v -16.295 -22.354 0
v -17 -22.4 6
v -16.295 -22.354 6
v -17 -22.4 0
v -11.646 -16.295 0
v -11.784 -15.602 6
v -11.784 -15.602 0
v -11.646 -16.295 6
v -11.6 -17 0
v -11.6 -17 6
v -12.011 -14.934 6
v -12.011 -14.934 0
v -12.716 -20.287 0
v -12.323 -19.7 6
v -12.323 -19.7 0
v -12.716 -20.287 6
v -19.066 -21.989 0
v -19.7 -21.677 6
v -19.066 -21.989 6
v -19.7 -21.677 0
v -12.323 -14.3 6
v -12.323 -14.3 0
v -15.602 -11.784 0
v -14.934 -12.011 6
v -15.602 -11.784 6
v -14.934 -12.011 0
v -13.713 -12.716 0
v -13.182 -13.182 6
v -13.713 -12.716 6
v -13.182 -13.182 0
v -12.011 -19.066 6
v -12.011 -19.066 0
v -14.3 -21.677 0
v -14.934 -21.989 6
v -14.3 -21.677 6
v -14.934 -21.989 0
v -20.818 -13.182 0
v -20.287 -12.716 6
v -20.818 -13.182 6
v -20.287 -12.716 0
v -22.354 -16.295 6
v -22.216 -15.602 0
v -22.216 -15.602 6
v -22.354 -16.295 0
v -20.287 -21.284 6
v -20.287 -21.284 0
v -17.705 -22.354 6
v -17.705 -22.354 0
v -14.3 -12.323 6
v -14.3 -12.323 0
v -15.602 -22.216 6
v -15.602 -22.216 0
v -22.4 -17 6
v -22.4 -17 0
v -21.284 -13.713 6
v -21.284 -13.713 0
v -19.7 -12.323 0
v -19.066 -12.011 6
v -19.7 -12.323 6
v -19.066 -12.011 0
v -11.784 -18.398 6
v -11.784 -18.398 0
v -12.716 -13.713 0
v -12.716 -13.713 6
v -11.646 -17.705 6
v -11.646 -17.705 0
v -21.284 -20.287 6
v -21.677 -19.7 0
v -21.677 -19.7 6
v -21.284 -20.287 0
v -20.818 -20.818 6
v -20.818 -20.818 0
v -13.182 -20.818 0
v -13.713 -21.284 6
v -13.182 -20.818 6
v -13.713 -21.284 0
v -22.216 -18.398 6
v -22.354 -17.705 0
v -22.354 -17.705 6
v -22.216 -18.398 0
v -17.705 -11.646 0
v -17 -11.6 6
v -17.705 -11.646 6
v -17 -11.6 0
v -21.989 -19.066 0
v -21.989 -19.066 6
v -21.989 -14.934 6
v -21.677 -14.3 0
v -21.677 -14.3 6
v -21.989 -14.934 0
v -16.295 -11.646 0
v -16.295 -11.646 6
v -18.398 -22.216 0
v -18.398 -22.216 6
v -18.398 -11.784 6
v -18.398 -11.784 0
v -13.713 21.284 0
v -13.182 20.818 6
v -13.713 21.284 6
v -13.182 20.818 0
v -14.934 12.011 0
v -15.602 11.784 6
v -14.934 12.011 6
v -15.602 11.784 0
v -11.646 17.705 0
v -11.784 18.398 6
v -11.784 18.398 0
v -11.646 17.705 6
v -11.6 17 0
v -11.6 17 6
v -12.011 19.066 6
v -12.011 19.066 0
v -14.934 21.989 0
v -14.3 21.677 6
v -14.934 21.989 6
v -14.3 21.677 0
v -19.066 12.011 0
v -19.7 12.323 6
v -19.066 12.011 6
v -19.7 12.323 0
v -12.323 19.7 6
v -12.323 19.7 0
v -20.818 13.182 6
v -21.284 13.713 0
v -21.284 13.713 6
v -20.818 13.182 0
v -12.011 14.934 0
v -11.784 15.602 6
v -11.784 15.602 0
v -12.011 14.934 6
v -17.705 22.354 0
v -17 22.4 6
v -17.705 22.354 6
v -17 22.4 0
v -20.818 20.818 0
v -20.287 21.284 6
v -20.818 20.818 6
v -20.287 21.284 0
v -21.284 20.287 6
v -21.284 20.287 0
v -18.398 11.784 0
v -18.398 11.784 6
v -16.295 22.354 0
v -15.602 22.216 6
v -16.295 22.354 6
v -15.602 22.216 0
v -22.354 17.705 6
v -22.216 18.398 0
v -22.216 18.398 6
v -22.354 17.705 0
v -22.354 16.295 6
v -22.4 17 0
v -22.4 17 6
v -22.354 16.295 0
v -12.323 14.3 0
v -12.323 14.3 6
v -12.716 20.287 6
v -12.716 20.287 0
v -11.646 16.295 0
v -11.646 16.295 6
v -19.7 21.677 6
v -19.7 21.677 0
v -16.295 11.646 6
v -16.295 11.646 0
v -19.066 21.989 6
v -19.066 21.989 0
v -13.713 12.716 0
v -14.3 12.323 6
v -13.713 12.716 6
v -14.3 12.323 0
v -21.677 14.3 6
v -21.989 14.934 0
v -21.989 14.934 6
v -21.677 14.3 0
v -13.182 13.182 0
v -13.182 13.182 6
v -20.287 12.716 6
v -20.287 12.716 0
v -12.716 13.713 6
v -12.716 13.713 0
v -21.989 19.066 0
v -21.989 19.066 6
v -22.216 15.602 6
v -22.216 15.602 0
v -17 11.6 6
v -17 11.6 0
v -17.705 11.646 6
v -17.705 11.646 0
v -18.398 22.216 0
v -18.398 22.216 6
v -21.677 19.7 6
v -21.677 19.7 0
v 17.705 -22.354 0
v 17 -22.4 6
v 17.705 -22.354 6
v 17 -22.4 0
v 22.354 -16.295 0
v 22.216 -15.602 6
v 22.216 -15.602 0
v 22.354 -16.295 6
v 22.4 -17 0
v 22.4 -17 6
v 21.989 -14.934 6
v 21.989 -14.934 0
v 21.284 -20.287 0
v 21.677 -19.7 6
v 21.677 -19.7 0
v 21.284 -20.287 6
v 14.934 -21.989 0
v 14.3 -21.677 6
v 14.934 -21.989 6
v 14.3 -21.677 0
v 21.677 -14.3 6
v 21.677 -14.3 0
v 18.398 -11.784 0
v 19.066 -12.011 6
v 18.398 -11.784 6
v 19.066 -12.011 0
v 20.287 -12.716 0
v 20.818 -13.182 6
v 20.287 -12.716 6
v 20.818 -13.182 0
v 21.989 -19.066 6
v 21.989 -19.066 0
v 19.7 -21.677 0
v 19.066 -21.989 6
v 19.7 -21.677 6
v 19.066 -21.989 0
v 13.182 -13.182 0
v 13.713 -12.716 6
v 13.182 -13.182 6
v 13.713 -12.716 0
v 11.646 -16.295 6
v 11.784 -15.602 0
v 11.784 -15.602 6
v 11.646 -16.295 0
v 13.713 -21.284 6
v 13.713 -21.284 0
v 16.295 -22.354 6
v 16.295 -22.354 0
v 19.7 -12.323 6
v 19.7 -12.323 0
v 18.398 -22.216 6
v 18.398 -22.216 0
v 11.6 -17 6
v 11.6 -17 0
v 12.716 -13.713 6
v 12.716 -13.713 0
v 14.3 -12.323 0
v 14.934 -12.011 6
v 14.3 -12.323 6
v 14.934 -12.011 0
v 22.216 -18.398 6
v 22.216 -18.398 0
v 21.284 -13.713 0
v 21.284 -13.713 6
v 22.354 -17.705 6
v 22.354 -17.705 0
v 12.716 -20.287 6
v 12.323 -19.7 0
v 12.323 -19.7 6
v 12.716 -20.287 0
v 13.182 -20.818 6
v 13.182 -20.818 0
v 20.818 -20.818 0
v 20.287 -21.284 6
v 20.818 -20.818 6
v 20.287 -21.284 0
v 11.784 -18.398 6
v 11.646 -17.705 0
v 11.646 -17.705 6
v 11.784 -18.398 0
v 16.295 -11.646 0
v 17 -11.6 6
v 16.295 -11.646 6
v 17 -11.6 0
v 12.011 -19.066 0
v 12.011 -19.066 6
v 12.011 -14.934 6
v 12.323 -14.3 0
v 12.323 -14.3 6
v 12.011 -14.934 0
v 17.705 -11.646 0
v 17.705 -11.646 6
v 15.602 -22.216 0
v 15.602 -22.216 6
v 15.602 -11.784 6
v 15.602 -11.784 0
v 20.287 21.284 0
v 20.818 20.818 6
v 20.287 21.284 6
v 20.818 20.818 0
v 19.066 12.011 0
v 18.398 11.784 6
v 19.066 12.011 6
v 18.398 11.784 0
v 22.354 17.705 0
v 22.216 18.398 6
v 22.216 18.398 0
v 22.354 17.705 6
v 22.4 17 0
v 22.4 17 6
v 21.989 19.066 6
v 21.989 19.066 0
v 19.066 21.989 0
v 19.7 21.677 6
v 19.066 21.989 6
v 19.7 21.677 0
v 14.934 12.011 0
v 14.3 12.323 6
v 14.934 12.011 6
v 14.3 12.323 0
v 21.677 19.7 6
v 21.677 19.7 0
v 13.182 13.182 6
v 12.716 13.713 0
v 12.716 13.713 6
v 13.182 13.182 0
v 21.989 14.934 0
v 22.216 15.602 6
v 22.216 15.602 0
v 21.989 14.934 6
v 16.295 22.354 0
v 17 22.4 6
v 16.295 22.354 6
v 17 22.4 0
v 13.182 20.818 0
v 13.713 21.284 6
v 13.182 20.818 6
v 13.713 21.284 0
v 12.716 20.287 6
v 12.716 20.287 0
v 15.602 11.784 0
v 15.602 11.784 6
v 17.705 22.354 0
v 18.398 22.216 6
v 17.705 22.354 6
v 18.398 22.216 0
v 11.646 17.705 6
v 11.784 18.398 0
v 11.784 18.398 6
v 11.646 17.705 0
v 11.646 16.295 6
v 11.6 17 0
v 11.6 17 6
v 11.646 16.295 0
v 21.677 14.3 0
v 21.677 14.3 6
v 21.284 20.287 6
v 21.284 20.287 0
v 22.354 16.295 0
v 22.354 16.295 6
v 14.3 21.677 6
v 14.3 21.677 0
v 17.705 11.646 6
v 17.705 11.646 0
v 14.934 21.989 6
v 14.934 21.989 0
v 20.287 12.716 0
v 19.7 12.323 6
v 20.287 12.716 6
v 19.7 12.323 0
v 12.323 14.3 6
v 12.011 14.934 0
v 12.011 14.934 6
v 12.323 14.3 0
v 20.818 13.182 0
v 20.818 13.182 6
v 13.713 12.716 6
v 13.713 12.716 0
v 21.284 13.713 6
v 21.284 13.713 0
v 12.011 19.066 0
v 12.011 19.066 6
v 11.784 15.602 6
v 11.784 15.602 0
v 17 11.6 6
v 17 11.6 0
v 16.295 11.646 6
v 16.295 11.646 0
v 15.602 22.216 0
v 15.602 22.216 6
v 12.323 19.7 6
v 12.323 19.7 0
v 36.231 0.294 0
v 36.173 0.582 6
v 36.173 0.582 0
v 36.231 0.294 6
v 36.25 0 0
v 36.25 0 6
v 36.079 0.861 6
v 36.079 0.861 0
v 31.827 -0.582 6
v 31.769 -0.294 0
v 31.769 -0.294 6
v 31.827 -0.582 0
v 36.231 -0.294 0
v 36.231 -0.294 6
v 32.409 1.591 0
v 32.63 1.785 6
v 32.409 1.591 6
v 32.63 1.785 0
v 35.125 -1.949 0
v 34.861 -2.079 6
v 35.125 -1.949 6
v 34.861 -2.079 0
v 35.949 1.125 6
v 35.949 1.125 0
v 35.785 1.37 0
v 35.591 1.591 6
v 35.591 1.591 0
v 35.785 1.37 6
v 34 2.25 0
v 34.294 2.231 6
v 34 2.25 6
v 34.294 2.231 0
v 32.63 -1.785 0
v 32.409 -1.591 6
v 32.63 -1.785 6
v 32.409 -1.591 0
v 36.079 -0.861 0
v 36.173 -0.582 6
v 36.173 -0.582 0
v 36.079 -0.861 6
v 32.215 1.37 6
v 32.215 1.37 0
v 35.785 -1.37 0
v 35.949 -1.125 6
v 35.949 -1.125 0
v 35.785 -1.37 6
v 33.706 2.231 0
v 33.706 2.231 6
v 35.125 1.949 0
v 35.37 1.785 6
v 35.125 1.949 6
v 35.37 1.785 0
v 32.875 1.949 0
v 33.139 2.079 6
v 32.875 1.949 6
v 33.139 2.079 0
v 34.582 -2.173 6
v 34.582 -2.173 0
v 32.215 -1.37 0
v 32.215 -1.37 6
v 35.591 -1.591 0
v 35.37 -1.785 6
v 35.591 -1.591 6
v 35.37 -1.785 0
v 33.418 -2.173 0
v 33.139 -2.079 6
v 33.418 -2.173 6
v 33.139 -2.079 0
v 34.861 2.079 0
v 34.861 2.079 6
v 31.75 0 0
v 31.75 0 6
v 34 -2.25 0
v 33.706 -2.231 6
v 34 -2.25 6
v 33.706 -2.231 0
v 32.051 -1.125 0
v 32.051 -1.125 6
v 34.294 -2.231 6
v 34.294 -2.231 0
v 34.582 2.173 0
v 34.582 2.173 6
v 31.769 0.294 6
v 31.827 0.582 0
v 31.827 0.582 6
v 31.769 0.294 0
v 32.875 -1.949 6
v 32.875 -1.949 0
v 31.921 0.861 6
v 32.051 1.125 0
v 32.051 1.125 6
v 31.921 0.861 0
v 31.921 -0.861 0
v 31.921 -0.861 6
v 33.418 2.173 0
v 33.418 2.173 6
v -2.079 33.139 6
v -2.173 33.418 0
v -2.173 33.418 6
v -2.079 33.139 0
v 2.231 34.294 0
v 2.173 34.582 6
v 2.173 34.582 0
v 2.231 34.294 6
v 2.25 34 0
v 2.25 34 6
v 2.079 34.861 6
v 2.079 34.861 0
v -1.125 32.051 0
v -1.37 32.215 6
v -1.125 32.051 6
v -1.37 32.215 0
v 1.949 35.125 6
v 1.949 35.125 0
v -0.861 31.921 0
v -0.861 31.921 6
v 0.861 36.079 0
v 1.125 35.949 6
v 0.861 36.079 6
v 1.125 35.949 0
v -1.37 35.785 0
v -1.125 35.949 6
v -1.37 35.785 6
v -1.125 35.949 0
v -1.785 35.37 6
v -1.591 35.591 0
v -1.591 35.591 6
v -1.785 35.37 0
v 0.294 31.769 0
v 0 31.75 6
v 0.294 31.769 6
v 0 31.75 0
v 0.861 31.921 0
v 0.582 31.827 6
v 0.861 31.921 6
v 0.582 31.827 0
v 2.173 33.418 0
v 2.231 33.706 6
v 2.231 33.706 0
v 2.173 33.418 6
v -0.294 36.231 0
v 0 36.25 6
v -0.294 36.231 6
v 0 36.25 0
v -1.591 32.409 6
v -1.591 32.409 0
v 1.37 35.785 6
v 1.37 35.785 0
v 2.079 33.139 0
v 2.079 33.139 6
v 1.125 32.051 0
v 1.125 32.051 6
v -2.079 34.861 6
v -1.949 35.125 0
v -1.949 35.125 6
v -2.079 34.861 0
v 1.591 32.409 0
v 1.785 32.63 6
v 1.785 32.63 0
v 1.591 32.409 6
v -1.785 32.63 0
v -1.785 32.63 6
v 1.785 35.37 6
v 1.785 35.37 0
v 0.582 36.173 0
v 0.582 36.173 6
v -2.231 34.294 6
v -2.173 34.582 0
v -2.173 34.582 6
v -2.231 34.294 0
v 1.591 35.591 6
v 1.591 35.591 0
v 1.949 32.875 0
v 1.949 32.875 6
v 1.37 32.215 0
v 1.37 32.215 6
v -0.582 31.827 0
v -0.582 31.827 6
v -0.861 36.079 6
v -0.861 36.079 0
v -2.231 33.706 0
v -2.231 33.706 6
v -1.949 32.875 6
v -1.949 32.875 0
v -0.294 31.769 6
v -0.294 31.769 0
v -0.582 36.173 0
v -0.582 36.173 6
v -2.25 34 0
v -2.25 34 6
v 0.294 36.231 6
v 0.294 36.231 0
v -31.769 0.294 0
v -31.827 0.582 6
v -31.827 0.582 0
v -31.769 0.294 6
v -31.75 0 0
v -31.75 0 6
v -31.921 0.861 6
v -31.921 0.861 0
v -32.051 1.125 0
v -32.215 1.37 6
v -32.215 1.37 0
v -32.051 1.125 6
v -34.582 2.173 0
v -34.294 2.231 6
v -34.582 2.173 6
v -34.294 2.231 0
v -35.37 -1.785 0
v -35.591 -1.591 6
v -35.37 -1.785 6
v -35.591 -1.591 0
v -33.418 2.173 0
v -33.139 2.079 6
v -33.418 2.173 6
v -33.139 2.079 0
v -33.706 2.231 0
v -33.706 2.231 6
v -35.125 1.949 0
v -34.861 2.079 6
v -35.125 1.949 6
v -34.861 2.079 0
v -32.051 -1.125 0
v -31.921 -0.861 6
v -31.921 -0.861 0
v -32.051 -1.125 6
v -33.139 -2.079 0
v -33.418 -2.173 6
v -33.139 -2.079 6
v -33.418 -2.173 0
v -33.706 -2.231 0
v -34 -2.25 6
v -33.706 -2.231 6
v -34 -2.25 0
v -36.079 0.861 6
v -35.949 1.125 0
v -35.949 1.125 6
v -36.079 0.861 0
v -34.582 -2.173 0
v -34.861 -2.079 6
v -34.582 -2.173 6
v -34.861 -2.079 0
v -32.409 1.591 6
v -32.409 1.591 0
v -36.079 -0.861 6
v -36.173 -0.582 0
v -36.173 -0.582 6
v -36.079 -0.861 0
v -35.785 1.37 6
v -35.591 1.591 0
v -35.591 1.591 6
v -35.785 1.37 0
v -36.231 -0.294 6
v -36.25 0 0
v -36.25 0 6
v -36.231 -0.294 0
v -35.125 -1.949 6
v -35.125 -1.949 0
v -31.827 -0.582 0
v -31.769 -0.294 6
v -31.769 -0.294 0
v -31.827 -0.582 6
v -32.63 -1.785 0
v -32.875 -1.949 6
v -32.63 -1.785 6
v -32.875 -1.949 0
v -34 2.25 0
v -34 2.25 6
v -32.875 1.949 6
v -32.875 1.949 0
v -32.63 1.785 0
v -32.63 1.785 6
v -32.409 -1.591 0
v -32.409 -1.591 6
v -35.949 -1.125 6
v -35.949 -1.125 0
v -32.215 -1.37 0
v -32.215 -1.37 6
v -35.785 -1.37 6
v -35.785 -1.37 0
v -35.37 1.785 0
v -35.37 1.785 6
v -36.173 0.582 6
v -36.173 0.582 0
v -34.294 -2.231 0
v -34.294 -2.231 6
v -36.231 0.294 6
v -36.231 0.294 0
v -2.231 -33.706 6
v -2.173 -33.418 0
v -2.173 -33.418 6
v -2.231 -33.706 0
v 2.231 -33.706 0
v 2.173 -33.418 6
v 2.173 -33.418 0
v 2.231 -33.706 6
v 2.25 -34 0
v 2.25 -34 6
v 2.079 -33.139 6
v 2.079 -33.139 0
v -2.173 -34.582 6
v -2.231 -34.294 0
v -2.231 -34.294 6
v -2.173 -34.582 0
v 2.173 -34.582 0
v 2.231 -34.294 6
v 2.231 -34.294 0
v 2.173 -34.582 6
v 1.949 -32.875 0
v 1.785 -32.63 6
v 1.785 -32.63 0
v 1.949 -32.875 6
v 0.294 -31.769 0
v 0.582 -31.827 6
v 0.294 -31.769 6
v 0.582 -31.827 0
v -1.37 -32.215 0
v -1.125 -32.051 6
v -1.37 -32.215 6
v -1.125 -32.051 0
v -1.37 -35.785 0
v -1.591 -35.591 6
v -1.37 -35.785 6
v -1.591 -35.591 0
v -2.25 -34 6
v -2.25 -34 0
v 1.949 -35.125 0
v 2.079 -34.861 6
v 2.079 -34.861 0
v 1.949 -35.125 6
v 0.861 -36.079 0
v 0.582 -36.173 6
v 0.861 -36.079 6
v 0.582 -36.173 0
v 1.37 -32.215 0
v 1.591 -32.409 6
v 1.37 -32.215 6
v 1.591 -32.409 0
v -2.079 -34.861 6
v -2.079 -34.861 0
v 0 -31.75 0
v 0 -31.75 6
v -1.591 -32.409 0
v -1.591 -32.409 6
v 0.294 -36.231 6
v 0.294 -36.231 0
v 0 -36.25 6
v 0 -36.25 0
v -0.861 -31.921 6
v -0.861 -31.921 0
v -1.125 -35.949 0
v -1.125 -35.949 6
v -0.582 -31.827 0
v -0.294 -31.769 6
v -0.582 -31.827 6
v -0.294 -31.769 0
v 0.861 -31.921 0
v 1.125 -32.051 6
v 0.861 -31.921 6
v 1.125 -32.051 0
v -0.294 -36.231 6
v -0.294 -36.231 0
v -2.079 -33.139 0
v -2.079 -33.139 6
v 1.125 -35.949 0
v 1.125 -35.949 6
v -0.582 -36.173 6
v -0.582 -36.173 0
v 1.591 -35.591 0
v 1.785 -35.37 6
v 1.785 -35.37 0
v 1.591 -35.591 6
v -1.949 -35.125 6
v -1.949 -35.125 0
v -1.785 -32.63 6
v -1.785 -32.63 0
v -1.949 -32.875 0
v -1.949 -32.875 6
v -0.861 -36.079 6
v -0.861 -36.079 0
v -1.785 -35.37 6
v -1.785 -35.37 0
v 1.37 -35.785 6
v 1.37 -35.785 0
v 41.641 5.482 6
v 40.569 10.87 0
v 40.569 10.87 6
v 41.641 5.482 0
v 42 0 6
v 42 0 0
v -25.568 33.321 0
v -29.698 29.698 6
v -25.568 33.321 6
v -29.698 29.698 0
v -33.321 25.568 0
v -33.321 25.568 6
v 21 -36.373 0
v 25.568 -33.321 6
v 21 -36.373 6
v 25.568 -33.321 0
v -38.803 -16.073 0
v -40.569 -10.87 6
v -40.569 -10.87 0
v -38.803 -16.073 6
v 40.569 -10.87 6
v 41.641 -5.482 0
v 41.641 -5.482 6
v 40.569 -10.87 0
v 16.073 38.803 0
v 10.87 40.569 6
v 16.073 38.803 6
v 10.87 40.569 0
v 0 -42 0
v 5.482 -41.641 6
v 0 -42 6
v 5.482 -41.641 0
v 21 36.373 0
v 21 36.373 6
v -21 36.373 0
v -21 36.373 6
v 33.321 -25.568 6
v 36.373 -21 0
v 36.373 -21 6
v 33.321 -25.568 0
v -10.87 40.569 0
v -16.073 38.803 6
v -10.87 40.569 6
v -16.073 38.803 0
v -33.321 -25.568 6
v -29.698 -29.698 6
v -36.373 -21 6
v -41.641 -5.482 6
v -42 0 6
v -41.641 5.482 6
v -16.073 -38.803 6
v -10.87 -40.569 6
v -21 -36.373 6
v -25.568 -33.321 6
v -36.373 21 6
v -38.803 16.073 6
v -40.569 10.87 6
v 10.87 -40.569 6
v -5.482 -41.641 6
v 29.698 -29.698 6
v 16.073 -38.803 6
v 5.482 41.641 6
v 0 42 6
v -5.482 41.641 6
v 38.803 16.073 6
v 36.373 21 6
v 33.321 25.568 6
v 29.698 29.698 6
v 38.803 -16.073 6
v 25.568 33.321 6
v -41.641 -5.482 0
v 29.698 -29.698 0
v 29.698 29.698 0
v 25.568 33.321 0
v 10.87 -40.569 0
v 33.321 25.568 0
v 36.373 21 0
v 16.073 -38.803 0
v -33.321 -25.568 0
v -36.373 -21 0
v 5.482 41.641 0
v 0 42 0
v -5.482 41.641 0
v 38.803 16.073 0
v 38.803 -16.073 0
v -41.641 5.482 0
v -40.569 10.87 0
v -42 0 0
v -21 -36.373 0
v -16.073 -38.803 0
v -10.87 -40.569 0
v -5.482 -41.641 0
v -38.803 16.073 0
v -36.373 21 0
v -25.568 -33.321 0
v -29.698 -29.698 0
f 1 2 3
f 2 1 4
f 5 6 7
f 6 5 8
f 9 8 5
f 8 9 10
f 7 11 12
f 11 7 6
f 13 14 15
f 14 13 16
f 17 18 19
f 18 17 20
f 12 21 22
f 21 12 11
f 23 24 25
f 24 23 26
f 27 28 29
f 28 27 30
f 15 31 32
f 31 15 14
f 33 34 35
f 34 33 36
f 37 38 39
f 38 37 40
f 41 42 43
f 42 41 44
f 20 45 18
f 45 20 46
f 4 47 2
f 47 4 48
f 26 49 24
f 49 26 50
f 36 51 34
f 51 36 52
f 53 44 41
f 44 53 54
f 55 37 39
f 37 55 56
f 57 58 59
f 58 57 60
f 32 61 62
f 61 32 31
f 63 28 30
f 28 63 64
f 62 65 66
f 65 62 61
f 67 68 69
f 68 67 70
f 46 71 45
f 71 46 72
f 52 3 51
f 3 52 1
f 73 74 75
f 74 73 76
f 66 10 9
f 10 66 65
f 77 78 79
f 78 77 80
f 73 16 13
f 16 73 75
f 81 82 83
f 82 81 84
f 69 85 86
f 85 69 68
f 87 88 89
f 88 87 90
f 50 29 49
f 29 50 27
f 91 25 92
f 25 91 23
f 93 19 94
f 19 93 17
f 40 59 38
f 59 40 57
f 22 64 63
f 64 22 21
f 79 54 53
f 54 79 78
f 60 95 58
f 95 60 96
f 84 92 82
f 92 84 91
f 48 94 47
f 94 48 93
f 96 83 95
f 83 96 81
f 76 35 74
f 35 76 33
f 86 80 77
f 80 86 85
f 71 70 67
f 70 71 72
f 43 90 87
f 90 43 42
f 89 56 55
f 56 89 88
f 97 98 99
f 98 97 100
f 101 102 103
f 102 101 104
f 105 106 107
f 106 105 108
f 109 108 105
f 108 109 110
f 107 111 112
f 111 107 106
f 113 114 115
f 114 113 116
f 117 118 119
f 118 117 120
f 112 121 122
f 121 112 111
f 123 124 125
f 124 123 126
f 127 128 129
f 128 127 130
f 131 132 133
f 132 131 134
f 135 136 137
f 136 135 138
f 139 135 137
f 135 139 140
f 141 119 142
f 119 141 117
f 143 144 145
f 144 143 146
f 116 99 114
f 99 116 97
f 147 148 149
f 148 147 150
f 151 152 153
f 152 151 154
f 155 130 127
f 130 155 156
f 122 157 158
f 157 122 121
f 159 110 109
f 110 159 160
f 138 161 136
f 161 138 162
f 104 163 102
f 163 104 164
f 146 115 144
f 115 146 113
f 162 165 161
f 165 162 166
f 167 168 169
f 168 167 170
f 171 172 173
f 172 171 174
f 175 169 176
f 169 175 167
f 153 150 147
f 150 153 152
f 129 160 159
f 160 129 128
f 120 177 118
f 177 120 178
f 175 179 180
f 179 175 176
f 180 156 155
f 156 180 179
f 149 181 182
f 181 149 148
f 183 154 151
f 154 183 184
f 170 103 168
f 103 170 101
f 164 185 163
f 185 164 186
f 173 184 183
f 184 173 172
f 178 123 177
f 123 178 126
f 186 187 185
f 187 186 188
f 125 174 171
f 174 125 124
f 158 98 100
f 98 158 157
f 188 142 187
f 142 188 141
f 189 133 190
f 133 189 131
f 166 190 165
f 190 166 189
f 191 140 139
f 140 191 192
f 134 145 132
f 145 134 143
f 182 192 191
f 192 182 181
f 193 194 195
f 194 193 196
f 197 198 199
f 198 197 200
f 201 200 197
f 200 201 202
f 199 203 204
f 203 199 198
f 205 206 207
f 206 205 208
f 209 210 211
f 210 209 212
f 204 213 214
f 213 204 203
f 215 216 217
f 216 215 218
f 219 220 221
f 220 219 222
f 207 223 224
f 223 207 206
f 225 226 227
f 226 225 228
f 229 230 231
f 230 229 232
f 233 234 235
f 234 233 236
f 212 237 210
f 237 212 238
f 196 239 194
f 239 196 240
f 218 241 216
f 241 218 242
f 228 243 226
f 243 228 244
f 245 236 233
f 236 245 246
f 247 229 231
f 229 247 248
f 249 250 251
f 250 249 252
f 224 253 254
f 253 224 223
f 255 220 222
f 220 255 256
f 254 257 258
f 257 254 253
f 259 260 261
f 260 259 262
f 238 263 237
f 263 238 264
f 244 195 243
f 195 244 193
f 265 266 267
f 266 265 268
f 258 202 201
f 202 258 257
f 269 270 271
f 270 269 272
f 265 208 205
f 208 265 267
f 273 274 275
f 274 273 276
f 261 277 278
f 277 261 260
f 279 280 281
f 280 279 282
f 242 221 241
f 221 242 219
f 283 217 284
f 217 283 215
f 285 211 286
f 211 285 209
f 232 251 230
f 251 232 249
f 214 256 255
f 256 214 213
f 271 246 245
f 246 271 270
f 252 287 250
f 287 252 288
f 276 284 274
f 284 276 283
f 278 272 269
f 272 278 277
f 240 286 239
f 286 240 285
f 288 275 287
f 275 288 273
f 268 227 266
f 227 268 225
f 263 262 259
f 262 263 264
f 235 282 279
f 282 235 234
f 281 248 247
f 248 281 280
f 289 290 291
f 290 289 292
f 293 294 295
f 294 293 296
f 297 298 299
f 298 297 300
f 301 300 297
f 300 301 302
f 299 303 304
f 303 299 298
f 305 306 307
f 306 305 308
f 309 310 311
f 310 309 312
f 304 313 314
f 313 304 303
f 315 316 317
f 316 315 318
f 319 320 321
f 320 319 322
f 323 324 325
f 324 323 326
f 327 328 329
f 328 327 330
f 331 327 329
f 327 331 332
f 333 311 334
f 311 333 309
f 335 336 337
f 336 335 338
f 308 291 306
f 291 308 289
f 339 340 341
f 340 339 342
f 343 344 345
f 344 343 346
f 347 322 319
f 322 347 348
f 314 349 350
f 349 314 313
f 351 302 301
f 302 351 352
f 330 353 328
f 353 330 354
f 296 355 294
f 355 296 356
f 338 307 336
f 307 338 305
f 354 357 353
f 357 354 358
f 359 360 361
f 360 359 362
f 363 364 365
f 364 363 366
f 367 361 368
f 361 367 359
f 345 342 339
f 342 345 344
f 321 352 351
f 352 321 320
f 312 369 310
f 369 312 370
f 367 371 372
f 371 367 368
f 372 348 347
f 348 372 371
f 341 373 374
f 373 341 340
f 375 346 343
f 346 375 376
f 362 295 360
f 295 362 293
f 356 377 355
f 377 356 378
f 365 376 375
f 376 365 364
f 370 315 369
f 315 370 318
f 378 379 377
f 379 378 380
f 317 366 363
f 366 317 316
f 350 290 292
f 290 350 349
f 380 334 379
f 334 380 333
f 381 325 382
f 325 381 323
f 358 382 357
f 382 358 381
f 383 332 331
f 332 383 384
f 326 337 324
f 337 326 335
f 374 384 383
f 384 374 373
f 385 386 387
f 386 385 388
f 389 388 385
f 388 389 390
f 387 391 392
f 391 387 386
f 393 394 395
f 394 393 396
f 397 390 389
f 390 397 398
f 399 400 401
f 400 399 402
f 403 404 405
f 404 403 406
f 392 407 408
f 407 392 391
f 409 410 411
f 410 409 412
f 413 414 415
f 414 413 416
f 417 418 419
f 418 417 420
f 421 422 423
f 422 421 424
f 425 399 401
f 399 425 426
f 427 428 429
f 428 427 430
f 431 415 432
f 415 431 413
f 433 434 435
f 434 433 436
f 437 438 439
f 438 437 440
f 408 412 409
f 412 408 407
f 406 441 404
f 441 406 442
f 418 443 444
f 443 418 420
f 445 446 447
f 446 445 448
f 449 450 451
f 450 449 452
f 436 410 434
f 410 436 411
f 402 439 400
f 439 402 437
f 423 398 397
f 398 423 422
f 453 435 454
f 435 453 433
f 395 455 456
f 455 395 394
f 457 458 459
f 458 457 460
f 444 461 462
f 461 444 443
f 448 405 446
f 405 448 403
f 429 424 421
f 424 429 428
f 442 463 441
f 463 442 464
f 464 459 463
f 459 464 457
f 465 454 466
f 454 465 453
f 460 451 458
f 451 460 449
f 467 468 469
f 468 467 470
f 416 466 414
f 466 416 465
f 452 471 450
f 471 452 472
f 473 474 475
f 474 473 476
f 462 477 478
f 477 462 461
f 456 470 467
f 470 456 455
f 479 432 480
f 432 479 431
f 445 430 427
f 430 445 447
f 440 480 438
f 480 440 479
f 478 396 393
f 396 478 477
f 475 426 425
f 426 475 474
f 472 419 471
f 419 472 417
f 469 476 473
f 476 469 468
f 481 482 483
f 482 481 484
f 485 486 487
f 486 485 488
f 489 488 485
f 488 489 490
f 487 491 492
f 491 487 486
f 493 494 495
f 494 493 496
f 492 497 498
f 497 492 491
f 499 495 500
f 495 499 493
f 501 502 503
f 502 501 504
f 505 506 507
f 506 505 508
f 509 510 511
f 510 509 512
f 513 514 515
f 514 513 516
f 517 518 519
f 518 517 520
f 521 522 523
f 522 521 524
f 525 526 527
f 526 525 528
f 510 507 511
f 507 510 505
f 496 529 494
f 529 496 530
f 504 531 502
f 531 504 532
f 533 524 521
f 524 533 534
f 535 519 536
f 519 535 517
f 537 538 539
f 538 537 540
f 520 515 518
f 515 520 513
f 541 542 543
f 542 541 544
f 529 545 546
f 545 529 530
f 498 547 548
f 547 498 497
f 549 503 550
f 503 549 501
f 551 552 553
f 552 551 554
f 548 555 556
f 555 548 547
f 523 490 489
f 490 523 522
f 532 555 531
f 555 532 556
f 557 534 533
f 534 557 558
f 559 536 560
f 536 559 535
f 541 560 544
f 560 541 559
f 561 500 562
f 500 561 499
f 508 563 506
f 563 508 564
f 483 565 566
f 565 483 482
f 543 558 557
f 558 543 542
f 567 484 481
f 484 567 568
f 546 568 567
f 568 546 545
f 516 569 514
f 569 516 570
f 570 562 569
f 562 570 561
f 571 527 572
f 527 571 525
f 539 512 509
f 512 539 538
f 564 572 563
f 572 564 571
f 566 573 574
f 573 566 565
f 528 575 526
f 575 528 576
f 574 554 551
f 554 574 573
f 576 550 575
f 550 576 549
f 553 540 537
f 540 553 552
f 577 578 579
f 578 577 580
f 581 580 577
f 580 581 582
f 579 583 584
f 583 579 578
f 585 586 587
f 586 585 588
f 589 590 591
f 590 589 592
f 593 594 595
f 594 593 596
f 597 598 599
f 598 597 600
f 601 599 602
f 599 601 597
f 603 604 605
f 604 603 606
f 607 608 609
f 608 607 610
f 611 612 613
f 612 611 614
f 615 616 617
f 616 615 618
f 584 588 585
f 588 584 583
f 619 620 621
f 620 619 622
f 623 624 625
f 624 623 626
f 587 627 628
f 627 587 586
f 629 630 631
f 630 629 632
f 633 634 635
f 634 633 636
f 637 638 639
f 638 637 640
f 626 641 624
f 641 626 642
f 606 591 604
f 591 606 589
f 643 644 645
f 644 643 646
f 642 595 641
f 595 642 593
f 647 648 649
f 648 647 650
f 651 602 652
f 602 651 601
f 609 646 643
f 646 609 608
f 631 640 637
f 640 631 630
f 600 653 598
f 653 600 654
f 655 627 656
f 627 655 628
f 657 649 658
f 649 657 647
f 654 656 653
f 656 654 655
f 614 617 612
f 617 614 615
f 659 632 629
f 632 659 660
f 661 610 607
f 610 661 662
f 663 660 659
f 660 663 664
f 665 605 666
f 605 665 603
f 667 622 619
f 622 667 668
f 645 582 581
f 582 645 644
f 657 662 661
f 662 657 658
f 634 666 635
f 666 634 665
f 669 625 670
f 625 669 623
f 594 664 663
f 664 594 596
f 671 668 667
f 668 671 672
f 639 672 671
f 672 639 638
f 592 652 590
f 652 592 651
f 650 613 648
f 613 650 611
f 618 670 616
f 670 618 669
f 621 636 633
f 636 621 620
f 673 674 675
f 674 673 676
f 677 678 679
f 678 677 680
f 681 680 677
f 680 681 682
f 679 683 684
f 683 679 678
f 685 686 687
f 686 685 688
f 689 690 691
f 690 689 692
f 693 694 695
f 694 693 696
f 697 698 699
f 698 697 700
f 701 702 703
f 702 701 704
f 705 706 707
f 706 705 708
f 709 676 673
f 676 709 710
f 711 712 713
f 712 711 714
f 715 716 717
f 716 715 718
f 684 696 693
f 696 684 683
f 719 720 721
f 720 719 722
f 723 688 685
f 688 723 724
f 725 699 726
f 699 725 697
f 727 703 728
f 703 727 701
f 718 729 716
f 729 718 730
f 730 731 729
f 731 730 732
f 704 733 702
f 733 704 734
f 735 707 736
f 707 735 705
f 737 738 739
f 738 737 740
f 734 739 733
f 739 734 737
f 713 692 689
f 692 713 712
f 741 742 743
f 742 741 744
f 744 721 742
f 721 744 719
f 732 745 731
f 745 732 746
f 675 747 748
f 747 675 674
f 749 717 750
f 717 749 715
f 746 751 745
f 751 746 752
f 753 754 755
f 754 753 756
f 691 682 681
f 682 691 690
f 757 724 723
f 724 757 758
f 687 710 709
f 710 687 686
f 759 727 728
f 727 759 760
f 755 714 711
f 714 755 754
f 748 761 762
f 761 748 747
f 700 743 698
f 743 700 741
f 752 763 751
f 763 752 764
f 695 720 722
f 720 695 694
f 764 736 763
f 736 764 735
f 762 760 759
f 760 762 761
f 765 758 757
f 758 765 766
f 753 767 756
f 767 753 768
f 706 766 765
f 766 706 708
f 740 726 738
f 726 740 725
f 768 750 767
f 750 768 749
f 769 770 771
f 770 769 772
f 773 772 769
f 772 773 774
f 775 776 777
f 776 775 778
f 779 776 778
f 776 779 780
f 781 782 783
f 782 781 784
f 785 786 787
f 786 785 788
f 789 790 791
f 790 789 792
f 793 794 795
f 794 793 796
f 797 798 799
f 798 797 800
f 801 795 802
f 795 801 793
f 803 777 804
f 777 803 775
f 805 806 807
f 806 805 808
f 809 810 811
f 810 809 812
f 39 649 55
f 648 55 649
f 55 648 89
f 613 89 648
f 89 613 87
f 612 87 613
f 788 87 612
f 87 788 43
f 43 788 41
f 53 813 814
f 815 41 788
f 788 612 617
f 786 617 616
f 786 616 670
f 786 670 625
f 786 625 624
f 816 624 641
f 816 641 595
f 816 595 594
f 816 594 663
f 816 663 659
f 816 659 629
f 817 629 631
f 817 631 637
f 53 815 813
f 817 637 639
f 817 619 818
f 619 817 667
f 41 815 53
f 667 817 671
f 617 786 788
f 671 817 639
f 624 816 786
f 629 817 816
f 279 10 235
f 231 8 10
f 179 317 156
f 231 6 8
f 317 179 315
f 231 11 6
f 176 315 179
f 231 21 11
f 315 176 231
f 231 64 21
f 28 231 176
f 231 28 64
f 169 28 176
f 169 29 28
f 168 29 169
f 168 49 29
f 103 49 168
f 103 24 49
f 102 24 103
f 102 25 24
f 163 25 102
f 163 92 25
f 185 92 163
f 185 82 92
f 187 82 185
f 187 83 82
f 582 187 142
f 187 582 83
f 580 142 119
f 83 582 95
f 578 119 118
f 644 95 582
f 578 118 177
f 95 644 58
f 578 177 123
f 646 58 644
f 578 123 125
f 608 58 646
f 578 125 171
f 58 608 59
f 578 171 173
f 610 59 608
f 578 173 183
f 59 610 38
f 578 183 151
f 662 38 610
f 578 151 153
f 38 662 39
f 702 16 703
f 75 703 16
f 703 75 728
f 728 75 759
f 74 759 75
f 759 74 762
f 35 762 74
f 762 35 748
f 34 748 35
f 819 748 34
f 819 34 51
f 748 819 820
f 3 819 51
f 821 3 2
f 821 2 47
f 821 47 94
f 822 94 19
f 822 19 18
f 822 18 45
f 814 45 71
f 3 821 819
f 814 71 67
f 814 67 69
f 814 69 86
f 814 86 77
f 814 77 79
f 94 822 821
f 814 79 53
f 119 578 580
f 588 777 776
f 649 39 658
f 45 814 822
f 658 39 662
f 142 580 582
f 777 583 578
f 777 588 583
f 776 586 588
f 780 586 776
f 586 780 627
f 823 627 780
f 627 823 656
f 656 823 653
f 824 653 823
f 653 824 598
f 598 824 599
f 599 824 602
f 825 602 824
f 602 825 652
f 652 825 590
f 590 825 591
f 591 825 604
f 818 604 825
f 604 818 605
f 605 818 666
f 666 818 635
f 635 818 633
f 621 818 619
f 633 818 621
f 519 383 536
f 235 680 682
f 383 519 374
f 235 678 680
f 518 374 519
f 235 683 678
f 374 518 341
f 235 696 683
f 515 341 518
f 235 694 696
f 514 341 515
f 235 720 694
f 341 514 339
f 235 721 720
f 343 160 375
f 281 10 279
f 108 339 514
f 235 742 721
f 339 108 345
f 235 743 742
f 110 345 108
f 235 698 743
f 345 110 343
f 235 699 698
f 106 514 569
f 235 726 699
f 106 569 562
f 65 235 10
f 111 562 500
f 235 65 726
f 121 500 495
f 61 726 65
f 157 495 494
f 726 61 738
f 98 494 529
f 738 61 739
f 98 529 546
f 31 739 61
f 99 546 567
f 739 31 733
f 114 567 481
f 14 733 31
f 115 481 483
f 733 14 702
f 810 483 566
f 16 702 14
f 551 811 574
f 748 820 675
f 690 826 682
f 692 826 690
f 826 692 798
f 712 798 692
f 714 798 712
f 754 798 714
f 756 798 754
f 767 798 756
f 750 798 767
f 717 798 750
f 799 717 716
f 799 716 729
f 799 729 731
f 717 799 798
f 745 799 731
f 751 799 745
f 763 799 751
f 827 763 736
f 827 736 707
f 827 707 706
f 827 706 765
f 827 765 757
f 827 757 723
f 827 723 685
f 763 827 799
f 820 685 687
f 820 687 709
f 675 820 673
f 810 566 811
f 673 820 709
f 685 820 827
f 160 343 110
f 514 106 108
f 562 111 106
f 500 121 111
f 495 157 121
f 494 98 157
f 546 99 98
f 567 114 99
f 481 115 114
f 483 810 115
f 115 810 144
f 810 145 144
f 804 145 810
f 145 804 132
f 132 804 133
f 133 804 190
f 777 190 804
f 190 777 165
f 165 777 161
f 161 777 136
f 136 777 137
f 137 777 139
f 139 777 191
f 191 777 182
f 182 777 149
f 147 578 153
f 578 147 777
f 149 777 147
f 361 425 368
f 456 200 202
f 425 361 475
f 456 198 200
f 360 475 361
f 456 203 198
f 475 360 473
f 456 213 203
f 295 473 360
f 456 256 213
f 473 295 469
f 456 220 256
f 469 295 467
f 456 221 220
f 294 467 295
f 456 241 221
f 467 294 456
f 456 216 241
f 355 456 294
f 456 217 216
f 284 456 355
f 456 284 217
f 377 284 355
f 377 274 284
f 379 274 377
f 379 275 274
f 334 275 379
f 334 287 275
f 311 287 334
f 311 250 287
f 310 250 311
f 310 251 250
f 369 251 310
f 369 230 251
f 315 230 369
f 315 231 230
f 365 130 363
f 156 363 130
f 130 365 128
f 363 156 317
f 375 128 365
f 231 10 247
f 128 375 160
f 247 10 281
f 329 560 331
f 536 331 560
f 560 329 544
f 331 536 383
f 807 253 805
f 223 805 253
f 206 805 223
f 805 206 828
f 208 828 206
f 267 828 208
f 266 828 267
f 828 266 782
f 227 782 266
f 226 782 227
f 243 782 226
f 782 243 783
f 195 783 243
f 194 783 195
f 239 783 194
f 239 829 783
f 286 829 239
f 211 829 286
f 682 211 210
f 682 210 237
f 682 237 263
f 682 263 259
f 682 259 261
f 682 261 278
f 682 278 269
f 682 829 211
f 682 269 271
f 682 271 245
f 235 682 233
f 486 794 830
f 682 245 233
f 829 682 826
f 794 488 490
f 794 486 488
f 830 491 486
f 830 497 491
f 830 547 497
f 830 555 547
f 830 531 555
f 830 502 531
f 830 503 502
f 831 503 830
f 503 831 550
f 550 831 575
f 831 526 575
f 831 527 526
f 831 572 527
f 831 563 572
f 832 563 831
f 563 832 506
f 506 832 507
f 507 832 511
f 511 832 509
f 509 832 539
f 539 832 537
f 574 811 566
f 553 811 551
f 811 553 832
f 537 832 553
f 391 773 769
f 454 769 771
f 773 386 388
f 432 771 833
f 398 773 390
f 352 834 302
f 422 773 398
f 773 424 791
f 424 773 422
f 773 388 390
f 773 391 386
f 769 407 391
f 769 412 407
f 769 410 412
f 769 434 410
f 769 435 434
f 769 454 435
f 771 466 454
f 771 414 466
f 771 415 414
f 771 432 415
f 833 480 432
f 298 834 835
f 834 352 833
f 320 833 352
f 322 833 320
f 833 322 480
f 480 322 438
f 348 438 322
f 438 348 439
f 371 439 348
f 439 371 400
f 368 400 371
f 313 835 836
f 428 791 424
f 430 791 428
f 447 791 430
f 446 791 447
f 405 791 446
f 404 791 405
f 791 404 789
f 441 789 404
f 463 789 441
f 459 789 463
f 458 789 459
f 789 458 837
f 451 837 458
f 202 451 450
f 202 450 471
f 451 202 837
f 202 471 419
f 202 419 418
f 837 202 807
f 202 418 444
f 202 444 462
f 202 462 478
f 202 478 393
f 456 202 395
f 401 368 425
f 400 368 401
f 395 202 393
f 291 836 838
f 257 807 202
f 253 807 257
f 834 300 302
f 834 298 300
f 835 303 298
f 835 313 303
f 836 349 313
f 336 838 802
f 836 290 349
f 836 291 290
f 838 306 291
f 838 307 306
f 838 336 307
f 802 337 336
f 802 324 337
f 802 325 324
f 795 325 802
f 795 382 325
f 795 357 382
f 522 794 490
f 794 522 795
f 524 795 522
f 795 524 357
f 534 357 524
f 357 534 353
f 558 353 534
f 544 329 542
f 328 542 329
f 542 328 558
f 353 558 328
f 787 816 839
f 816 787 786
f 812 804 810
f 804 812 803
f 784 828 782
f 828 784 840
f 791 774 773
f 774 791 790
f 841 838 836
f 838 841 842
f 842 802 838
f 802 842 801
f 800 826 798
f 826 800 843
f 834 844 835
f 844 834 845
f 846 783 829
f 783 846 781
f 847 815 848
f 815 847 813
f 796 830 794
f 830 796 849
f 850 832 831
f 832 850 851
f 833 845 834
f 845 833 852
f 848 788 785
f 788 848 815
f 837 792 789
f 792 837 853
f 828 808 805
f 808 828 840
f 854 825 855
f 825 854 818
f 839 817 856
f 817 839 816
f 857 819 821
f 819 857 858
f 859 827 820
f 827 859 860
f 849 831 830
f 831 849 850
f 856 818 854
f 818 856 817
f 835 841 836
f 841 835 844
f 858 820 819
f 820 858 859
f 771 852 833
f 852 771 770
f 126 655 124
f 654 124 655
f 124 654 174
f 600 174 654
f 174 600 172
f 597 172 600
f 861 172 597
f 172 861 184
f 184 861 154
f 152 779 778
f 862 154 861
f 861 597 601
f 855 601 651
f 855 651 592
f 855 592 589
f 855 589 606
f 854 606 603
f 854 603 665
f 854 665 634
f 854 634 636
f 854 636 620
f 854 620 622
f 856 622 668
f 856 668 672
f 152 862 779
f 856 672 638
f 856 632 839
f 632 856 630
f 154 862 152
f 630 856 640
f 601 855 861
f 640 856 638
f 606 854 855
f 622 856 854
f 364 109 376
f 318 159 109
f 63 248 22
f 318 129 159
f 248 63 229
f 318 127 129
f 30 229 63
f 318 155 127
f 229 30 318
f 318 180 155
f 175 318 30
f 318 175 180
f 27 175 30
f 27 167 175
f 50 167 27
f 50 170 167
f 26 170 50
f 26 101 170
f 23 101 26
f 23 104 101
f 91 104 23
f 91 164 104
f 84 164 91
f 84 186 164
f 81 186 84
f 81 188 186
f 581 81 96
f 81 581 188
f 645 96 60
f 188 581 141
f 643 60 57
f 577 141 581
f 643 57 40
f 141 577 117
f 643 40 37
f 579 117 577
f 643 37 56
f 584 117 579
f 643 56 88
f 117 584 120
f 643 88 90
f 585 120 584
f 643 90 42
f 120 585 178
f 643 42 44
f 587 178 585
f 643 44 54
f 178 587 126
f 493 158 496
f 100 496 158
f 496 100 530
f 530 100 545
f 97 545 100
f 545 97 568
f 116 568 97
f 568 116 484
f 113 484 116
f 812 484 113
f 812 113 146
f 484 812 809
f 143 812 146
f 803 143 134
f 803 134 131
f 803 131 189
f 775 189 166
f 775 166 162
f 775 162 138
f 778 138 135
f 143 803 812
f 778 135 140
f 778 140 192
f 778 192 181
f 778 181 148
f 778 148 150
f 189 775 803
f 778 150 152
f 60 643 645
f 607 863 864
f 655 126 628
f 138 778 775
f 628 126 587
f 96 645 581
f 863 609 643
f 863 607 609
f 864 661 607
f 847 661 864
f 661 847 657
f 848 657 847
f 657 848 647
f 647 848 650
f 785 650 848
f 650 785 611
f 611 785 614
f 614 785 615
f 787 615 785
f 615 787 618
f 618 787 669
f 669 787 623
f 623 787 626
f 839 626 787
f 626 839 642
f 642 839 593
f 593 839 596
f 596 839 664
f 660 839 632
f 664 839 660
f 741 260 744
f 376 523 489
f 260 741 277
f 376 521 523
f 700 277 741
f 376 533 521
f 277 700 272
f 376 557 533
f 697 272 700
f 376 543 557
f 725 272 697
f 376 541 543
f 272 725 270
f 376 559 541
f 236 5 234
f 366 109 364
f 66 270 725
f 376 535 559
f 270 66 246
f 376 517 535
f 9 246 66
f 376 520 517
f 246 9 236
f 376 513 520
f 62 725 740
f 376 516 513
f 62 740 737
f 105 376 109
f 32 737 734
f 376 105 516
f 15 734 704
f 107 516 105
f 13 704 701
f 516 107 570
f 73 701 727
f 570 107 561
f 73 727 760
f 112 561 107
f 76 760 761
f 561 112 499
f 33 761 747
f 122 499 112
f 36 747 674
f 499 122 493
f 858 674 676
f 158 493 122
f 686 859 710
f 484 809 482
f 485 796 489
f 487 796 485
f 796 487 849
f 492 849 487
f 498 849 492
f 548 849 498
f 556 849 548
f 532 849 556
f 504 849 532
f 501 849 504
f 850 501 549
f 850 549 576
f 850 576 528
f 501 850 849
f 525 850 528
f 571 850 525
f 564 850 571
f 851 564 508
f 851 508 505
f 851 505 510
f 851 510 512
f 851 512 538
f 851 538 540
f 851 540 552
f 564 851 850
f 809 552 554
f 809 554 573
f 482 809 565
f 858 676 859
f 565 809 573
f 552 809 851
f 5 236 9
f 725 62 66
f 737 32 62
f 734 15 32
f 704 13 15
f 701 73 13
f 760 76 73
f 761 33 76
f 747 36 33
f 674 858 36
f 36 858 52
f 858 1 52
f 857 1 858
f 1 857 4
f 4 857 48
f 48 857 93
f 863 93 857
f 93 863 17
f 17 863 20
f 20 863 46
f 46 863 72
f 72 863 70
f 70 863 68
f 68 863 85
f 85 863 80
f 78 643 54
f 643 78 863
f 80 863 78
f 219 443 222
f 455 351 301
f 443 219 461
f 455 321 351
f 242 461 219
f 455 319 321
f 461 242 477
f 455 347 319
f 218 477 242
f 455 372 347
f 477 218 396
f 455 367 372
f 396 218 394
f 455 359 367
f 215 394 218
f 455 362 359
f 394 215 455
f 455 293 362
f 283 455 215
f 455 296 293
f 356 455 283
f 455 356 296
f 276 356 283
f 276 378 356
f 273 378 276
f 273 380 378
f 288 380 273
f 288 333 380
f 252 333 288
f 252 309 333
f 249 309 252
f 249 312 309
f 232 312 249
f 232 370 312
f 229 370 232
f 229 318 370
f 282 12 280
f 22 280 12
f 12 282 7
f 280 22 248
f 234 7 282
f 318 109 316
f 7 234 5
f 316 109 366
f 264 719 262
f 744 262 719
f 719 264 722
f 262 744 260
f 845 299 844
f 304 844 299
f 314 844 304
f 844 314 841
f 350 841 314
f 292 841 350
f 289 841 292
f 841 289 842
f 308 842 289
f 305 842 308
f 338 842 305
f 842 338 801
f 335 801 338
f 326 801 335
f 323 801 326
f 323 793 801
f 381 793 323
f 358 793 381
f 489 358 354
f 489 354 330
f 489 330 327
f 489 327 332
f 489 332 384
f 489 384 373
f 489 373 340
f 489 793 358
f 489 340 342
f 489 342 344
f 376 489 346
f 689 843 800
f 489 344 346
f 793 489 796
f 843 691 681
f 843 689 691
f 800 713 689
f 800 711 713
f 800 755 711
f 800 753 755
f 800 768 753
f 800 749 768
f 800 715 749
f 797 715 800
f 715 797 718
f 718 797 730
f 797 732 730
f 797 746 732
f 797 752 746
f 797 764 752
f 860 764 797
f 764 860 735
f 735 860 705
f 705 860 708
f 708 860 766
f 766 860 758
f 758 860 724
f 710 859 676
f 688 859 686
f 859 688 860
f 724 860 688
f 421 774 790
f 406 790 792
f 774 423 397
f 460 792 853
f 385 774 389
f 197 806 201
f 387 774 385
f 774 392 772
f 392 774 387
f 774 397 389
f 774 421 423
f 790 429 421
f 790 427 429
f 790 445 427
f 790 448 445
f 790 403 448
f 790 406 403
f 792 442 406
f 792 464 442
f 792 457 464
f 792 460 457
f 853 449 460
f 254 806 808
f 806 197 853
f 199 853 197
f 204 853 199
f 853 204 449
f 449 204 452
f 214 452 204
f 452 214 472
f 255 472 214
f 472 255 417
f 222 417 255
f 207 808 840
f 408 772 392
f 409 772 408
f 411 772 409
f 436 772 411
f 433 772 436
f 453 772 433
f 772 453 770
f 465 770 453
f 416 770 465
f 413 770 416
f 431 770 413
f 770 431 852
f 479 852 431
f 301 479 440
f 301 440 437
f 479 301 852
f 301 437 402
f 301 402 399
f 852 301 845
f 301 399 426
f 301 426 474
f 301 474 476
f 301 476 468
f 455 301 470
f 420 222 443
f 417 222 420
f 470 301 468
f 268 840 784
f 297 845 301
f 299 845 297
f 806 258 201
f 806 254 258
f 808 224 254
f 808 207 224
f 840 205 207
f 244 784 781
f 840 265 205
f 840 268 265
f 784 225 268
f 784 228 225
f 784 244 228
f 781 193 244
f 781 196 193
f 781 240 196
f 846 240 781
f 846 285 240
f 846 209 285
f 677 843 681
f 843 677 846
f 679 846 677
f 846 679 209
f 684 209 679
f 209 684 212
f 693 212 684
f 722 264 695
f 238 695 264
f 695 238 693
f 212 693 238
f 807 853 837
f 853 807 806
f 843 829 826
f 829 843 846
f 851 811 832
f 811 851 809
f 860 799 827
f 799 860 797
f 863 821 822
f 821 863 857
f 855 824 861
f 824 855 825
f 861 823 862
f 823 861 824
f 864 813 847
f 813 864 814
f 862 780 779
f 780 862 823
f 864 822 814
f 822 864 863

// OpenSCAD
// file: ../common.scad
/* =============================================================================
 * 智慧香爐 — 共用輔助模組
 * =============================================================================
 * 圓角方柱、倒角、通風柵格、螺柱、頂緣台階、定位榫。
 * 零件檔一律 include 本檔（會連帶帶進 params.scad）。
 * ============================================================================= */

include <params.scad>

// ═══════════════════════════════════════════════════════════════════════════
// 共用輔助模組
// ═══════════════════════════════════════════════════════════════════════════

// 圓角方柱：用 4 根圓柱做 hull，比 minkowski 快很多
module rrect(w, d, h, r) {
    hull() {
        for (x = [r, w - r], y = [r, d - r])
            translate([x, y, 0]) cylinder(h = h, r = r);
    }
}

// 圓角方柱（底緣倒角版）：改善首層附著並讓外型更柔和
module rrect_chamfered(w, d, h, r, c = CHAMFER) {
    union() {
        // 倒角裙邊
        hull() {
            for (x = [r, w - r], y = [r, d - r])
                translate([x, y, 0]) cylinder(h = c, r1 = r - c, r2 = r);
        }
        translate([0, 0, c]) rrect(w, d, h - c, r);
    }
}

// 螺柱座（含自攻底孔）。pilot 依板子自己的孔徑給，不是統一值。
module standoff(h = STANDOFF_H, pilot = M3_PILOT) {
    difference() {
        cylinder(h = h, d = standoff_od(pilot));
        translate([0, 0, -0.1]) cylinder(h = h + 0.2, d = pilot);
    }
}

// 通風柵格：一排長圓孔。用於側面進氣與感測器艙開口。
module vent_slots(n, slot_w, slot_h, pitch, depth) {
    for (i = [0 : n - 1])
        translate([i * pitch, 0, 0])
            hull() {
                translate([0, slot_h / 2 - slot_w / 2, 0])
                    cylinder(h = depth, d = slot_w, $fn = 16);
                translate([0, -slot_h / 2 + slot_w / 2, 0])
                    cylinder(h = depth, d = slot_w, $fn = 16);
            }
}

// 頂緣承接台階：讓定位榫有實體可坐，同時作為上層零件的落座面
module top_ledge(w, d, z, r) {
    translate([0, 0, z])
        difference() {
            translate([WALL, WALL, 0])
                rrect(w - WALL * 2, d - WALL * 2, LEDGE_H, r - WALL);
            translate([WALL + LEDGE_W, WALL + LEDGE_W, -0.1])
                rrect(w - (WALL + LEDGE_W) * 2, d - (WALL + LEDGE_W) * 2,
                      LEDGE_H + 0.2, max(r - WALL - LEDGE_W, 0.5));
        }
}

// 定位榫（公）：四角
module tenons_male(w, d, z) {
    for (x = [TENON_INSET, w - TENON_INSET], y = [TENON_INSET, d - TENON_INSET])
        translate([x, y, z])
            cylinder(h = TENON_H, d1 = TENON_D, d2 = TENON_D - 1.2);  // 帶錐度好插入
}

// 定位榫（母）：對應的孔
module tenons_female(w, d, z) {
    for (x = [TENON_INSET, w - TENON_INSET], y = [TENON_INSET, d - TENON_INSET])
        translate([x, y, z - 0.1])
            cylinder(h = TENON_H + 0.2, d = TENON_D + FIT * 2);
}
// main file
/* =============================================================================
 * 智慧香爐 — 零件：插孔板（理香機構）
 * =============================================================================
 * 理香機構的一部分（用途見 ../params.scad 的「理香機構」段）。
 * 尺寸全部來自 ../params.scad，本檔不寫死任何數字。
 * ★這套機構不需要明火★——插未點燃的香就能演示。
 * ============================================================================= */

include <../common.scad>


// 原點：板底面圓心。孔位在 (±pitch/2, ±pitch/2)。
module tidy_holes(d, h, z = -0.1) {
    o = TIDY_HOLE_PITCH / 2;
    for (x = [-o, o], y = [-o, o])
        translate([x, y, z]) cylinder(h = h, d = d);
}

module socket_plate() {
    difference() {
        // 不做外凸法蘭——板子要能從罩頂開口放進去，多一圈凸緣只會卡住。
        // 改由集煙罩內側的四個凸耳承接（見 parts/hood.scad）。
        cylinder(h = TIDY_PLATE_T, d = TIDY_PLATE_DIA);
        // 套筒孔——★要留餘隙讓套筒能擺動，才回正得了★
        tidy_holes(TIDY_HOLE_DIA, TIDY_PLATE_T + 0.2);

        // M4 通孔（鎖到磁座的螺柱上）
        for (a = [0, 90, 180, 270])   // 與磁座螺柱同角度（見 magnet_deck.scad）
            translate([TIDY_BOLT_R * cos(a), TIDY_BOLT_R * sin(a), -0.1])
                cylinder(h = TIDY_PLATE_T + 0.2, d = M4_CLEAR);
    }
}

// ── 單獨開檔時的預覽（被 use<> 引入時不執行）──
socket_plate();
